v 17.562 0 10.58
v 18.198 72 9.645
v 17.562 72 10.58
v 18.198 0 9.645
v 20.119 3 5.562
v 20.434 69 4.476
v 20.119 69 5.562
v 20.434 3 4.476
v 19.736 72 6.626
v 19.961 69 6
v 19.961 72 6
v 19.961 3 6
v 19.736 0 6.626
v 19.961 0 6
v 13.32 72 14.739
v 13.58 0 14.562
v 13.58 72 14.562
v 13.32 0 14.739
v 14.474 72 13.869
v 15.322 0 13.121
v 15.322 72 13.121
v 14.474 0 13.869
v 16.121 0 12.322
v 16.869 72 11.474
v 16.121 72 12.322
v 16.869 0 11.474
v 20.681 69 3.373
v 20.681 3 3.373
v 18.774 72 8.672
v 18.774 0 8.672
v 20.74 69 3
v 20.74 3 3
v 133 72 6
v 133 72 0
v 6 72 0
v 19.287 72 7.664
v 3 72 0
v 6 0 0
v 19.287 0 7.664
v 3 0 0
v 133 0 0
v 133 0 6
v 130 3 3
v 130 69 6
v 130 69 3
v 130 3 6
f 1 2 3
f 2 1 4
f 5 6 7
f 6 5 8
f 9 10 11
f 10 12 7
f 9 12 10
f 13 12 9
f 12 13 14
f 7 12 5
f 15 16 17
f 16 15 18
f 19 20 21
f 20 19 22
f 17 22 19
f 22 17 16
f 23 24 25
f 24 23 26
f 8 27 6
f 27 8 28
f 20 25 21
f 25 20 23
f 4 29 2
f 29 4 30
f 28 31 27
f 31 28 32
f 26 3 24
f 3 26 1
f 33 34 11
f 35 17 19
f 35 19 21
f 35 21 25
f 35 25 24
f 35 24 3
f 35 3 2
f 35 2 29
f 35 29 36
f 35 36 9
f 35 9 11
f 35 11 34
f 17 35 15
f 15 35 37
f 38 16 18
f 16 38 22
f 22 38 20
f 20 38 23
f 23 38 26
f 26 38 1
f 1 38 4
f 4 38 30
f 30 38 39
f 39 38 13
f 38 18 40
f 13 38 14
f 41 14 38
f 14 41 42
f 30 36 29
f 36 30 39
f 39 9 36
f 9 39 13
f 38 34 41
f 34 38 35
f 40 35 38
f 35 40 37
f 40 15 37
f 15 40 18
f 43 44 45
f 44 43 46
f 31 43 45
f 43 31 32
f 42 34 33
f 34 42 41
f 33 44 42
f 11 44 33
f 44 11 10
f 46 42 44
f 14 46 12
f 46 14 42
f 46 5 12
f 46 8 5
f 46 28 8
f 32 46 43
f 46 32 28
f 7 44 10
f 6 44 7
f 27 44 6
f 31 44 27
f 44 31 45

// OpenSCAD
// file: wedge.scad
// From https://www.thingiverse.com/thing:40245
// Code by Alex English

module wedge_180(h, r, d)
{
  rotate(d)
    difference() {
    rotate(180-d)
      difference() {
        cylinder(h = h, r = r);
        translate([-(r+1), 0, -1]) {
          cube([r*2+2, r+1, h+2]);
        }
      }
      translate([-(r+1), 0, -1]) {
        cube([r*2+2, r+1, h+2]);
      }
   }
}

module wedge(h, r, d)
{
  if(d <= 180) {
    wedge_180(h, r, d);
  } else {
    rotate(d) {
      difference() {
        cylinder(h = h, r = r);
	translate([0, 0, -1]) {
	  wedge_180(h+2, r+1, 360-d);
        }
      }
    }
  }
}
// main file
use <wedge.scad>
{
  back_plate_length = 130;
  back_plate_width = 72;
  back_plate_thickness = 3;
  top_return_height = 21;
  top_return_length = 15;

  bottom_return_length = 25;
  $fn = 100;
}


module back_plate()
{
  translate([back_plate_thickness, 0, 0]) {
    cube([back_plate_length, back_plate_width, back_plate_thickness]);
    translate([back_plate_length, 0, 0]) {
      cube([back_plate_thickness, back_plate_width,
            top_return_height + back_plate_thickness]);
    }
    translate([back_plate_length - top_return_length, 0,
               top_return_height + back_plate_thickness]) {
      cube([top_return_length + back_plate_thickness, back_plate_width,
            back_plate_thickness]);
    }
  }
}

module bottom_return()
{
  thickness = 3;
  height = 12;
  cube([bottom_return_length, back_plate_width, thickness]);
  translate([0, 10 - thickness, thickness]) {
    cube([bottom_return_length, thickness, height]);
  }
  translate([0, 24, thickness]) {
    cube([bottom_return_length, thickness, height]);
  }
  translate([0, 40, thickness]) {
    cube([bottom_return_length, thickness, height]);
  }
  translate([0, 10 - thickness, height]) {
    cube([thickness, 39-thickness, thickness]);
  }
  translate([0, 40, height]) {
    cube([bottom_return_length, back_plate_width-40, thickness]);
  }
  translate([0, 0, height]) {
    cube([bottom_return_length, 10, thickness]);
  }
}

module front_part(angle) {
  rotate([0,angle,0]) {
    back_plate();
  }
  rotate([0, 90-angle, 0]) {
    translate([-25, 0, 0]) {
      bottom_return();
    }
  }
}

module back_part() {
  back_part_length = back_plate_length - 2*back_plate_thickness;
  translate([2*back_plate_thickness, 0, 0]) {
    cube([back_part_length, back_plate_width, back_plate_thickness]);
  }
  translate([3*back_plate_thickness, 0, 0]) {
    cube([back_part_length, back_plate_thickness, 2*back_plate_thickness]);
  }
  translate([3*back_plate_thickness,
             back_plate_width - back_plate_thickness, 0]) {
    cube([back_part_length, back_plate_thickness, 2*back_plate_thickness]);
  }
  translate([back_plate_length, 0, 0]) {
    cube([back_plate_thickness, back_plate_width, 2*back_plate_thickness]);
  }
  translate([back_plate_thickness, back_plate_width, 0]) {
    rotate([90, 0, 0]) {
      wedge(back_plate_width, 18, 55);
    }
  }
  
}

module part() {
  // front_part(0);
  back_part();
}

rotate([0, 0, 0]) {
  part();
}
